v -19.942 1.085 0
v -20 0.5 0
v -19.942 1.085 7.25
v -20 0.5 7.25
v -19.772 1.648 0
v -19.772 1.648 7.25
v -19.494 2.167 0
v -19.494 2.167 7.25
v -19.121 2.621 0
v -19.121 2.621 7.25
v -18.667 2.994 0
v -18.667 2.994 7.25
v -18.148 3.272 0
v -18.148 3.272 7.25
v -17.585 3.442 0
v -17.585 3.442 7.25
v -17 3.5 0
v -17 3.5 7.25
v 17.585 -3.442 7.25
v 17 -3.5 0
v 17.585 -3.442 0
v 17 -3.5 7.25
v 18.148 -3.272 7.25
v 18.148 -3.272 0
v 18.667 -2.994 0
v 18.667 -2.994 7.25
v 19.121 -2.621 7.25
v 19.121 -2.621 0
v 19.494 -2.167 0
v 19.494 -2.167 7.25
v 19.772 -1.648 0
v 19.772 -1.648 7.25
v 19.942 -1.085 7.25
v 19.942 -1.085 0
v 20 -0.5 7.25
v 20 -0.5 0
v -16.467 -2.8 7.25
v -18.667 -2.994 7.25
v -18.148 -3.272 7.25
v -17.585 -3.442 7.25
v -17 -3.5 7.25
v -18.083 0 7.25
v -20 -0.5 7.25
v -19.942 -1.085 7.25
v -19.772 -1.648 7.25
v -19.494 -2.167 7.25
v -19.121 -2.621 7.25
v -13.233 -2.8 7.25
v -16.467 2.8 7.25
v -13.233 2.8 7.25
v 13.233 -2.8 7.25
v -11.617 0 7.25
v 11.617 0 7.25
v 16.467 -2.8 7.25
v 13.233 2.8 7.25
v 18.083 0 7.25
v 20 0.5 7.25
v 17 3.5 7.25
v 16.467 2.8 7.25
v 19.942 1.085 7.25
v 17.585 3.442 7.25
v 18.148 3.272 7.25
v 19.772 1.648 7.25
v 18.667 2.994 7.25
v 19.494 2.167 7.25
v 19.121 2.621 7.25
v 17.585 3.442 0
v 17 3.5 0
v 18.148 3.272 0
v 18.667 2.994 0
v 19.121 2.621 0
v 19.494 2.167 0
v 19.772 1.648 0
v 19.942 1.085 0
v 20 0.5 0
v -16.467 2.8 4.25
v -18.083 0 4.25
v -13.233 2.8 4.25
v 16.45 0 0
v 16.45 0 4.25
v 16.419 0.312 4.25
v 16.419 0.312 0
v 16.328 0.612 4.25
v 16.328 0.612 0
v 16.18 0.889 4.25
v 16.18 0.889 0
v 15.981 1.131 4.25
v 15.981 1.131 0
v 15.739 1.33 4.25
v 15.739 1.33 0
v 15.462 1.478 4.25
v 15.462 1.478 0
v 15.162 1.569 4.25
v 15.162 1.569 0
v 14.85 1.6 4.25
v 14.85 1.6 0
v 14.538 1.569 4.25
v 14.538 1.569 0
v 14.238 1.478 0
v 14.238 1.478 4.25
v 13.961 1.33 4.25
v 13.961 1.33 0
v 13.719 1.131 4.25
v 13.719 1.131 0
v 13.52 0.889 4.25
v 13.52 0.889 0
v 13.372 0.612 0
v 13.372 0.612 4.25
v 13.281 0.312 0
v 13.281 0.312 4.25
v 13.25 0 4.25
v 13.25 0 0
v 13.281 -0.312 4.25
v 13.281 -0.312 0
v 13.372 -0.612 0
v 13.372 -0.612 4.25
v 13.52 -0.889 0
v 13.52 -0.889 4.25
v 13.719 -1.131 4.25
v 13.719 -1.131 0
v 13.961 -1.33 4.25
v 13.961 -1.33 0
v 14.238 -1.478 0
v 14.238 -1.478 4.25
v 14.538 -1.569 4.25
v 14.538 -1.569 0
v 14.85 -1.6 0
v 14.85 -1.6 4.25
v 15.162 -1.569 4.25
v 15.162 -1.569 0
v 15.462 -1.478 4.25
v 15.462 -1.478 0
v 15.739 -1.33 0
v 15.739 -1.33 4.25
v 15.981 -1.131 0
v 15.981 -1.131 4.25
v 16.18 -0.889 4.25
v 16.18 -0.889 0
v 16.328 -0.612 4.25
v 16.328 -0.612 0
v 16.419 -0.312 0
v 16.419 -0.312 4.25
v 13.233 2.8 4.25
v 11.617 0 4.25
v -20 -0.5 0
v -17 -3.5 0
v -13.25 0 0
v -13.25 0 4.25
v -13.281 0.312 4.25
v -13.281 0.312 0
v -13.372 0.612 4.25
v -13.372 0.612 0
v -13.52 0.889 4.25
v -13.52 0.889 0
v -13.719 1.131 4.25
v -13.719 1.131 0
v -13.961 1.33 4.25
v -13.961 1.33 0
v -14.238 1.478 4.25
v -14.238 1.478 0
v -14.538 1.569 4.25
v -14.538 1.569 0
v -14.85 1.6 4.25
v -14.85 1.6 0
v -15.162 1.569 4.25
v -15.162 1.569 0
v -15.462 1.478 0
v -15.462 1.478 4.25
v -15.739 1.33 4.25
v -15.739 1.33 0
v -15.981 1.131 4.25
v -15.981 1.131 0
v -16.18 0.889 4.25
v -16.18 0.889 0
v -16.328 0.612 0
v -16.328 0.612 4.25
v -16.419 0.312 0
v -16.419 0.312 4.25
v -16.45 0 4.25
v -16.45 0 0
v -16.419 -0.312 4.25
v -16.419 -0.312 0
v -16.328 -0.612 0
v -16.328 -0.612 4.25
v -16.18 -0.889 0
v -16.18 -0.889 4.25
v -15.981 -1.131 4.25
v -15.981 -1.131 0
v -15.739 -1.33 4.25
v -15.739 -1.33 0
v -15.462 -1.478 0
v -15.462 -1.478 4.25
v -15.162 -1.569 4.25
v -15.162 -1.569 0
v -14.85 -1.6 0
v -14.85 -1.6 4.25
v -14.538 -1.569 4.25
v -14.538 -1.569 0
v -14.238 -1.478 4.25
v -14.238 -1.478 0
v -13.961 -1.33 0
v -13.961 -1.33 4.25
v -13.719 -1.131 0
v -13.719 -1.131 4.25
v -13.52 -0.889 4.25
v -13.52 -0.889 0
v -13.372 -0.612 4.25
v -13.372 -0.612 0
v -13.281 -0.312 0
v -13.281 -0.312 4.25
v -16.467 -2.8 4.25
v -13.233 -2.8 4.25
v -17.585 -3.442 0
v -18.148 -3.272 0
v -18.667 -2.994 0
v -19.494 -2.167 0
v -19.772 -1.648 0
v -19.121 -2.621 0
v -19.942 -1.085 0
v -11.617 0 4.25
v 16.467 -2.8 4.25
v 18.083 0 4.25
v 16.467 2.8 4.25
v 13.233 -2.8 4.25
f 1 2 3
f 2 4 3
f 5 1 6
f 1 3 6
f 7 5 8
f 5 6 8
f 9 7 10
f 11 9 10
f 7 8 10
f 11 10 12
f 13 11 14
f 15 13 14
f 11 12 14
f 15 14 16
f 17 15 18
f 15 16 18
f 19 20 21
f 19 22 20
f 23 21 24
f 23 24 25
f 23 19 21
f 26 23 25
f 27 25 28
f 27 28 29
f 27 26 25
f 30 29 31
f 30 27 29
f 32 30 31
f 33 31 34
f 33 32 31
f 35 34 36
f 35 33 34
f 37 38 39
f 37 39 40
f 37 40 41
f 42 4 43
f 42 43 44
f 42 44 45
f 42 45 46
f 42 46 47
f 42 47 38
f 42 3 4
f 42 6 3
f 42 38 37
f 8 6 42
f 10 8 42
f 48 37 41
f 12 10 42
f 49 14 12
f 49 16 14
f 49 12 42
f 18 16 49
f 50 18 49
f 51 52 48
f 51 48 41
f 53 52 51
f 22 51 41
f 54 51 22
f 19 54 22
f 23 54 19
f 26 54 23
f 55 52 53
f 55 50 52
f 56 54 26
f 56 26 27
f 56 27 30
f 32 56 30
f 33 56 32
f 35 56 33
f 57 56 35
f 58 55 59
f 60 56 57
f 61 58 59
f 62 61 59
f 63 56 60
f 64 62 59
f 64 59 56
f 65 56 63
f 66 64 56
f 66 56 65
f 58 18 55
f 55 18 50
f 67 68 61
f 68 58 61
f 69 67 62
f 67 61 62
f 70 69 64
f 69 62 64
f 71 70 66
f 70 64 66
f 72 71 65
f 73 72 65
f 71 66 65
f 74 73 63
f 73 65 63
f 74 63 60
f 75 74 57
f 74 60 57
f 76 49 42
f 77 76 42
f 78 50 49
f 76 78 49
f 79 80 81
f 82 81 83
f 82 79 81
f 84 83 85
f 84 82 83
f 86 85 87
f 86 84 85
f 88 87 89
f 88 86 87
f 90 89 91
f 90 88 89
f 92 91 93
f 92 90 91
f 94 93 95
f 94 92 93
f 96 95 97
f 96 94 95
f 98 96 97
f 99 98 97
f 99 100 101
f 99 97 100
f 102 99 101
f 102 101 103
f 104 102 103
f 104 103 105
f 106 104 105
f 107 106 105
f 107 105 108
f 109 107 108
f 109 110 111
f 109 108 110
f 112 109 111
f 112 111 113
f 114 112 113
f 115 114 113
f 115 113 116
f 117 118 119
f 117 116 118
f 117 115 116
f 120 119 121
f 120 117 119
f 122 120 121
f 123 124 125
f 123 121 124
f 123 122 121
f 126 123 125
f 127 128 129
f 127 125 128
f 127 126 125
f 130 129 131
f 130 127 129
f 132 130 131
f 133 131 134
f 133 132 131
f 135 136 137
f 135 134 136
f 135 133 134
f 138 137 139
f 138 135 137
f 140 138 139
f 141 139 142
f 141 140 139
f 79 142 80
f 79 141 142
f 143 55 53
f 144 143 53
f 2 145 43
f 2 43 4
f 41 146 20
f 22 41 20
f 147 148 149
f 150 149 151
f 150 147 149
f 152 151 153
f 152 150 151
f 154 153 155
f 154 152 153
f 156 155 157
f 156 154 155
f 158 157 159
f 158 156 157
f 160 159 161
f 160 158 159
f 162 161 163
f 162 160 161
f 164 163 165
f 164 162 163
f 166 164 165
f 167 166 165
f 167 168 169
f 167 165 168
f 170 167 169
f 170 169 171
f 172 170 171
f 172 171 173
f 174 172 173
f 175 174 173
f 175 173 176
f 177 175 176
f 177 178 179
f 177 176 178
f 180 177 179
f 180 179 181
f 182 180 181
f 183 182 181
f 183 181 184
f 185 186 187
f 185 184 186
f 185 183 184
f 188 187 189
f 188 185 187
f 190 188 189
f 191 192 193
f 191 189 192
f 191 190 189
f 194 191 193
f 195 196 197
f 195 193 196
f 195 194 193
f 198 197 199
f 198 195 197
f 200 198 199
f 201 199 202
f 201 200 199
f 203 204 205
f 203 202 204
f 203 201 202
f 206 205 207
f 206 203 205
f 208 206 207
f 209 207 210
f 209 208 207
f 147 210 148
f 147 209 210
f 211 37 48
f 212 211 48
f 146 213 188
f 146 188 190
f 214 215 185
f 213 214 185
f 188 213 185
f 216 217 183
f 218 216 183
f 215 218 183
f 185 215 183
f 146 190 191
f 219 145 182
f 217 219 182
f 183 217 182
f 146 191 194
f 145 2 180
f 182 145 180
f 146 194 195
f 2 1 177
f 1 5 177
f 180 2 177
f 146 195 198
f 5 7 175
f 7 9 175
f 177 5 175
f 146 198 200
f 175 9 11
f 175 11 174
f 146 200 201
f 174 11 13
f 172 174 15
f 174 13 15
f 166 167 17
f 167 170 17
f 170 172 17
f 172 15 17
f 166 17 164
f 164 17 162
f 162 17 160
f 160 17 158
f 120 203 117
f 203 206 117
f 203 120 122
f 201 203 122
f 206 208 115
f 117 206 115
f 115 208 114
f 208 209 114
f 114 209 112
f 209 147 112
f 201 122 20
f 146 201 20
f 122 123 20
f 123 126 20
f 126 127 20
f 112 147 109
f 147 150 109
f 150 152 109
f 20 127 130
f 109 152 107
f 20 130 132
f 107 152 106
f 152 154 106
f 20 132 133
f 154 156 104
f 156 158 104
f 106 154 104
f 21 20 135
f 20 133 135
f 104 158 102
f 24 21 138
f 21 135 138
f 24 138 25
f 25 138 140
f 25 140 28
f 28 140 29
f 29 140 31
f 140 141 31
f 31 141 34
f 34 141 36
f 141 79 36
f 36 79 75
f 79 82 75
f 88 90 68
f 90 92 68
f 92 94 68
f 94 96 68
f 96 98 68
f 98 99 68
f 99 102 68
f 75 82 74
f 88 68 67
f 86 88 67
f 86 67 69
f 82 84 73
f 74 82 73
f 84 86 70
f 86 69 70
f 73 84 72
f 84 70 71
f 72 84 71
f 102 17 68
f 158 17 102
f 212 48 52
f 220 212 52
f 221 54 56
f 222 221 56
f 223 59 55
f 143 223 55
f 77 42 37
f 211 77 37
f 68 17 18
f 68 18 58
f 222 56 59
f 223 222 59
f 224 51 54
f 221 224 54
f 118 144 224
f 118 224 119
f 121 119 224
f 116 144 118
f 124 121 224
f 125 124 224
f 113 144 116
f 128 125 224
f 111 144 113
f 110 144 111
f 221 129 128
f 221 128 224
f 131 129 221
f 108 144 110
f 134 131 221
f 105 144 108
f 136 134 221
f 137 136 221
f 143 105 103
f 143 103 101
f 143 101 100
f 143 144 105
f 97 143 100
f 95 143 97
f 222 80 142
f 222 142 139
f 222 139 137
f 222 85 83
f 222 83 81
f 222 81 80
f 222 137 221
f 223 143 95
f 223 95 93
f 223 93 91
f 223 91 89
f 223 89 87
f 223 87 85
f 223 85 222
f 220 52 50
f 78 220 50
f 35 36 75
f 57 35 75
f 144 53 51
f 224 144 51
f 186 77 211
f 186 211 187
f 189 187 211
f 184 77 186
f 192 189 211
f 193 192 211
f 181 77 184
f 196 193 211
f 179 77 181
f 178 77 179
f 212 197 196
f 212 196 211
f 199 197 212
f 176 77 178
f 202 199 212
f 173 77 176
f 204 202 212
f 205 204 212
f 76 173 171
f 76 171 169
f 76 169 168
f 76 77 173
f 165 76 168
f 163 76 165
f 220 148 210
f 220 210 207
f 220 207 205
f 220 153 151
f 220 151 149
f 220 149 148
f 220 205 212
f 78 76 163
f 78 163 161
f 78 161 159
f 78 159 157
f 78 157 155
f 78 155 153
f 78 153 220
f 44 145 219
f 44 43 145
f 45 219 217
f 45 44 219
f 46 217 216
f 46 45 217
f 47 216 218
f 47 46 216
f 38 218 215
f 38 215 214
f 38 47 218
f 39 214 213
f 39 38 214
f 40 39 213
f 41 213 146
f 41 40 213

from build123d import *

# Parameters (mm, degrees)
SKETCH_W     = 40
SKETCH_H     = 7
SKETCH_R     = 1.6
PAD_DEPTH    = 7.25
POCKET_DEPTH = 3
FILLET_R     = 3


with BuildPart() as part:
    # Sketch → Pad (new body)
    with BuildSketch(Plane.XY):
        Rectangle(SKETCH_W, SKETCH_H)
        with Locations((-14.85, 0)):
            Circle(SKETCH_R, mode=Mode.SUBTRACT)
        with Locations((14.85, 0)):
            Circle(SKETCH_R, mode=Mode.SUBTRACT)
    extrude(amount=PAD_DEPTH)

    # Sketch001 (on Face8 of Pad) → Pocket (cut)
    with BuildSketch(Plane.XY.offset(7.25)):
        Polygon((-11.616838, 0), (-13.233419, 2.8), (-16.466581, 2.8), (-18.083162, 0), (-16.466581, -2.8), (-13.233419, -2.8), align=None)
        Polygon((11.616838, 0), (13.233419, -2.8), (16.466581, -2.8), (18.083162, 0), (16.466581, 2.8), (13.233419, 2.8), align=None)
    extrude(amount=-POCKET_DEPTH, mode=Mode.SUBTRACT)

    # Fillet
    fillet_edges = [part.edges().sort_by_distance(p)[0] for p in [
        (20, -3.5, 3.625),
        (20, 3.5, 3.625),
        (-20, 3.5, 3.625),
        (-20, -3.5, 3.625),
    ]]
    fillet(fillet_edges, radius=FILLET_R)


solid = part.part
